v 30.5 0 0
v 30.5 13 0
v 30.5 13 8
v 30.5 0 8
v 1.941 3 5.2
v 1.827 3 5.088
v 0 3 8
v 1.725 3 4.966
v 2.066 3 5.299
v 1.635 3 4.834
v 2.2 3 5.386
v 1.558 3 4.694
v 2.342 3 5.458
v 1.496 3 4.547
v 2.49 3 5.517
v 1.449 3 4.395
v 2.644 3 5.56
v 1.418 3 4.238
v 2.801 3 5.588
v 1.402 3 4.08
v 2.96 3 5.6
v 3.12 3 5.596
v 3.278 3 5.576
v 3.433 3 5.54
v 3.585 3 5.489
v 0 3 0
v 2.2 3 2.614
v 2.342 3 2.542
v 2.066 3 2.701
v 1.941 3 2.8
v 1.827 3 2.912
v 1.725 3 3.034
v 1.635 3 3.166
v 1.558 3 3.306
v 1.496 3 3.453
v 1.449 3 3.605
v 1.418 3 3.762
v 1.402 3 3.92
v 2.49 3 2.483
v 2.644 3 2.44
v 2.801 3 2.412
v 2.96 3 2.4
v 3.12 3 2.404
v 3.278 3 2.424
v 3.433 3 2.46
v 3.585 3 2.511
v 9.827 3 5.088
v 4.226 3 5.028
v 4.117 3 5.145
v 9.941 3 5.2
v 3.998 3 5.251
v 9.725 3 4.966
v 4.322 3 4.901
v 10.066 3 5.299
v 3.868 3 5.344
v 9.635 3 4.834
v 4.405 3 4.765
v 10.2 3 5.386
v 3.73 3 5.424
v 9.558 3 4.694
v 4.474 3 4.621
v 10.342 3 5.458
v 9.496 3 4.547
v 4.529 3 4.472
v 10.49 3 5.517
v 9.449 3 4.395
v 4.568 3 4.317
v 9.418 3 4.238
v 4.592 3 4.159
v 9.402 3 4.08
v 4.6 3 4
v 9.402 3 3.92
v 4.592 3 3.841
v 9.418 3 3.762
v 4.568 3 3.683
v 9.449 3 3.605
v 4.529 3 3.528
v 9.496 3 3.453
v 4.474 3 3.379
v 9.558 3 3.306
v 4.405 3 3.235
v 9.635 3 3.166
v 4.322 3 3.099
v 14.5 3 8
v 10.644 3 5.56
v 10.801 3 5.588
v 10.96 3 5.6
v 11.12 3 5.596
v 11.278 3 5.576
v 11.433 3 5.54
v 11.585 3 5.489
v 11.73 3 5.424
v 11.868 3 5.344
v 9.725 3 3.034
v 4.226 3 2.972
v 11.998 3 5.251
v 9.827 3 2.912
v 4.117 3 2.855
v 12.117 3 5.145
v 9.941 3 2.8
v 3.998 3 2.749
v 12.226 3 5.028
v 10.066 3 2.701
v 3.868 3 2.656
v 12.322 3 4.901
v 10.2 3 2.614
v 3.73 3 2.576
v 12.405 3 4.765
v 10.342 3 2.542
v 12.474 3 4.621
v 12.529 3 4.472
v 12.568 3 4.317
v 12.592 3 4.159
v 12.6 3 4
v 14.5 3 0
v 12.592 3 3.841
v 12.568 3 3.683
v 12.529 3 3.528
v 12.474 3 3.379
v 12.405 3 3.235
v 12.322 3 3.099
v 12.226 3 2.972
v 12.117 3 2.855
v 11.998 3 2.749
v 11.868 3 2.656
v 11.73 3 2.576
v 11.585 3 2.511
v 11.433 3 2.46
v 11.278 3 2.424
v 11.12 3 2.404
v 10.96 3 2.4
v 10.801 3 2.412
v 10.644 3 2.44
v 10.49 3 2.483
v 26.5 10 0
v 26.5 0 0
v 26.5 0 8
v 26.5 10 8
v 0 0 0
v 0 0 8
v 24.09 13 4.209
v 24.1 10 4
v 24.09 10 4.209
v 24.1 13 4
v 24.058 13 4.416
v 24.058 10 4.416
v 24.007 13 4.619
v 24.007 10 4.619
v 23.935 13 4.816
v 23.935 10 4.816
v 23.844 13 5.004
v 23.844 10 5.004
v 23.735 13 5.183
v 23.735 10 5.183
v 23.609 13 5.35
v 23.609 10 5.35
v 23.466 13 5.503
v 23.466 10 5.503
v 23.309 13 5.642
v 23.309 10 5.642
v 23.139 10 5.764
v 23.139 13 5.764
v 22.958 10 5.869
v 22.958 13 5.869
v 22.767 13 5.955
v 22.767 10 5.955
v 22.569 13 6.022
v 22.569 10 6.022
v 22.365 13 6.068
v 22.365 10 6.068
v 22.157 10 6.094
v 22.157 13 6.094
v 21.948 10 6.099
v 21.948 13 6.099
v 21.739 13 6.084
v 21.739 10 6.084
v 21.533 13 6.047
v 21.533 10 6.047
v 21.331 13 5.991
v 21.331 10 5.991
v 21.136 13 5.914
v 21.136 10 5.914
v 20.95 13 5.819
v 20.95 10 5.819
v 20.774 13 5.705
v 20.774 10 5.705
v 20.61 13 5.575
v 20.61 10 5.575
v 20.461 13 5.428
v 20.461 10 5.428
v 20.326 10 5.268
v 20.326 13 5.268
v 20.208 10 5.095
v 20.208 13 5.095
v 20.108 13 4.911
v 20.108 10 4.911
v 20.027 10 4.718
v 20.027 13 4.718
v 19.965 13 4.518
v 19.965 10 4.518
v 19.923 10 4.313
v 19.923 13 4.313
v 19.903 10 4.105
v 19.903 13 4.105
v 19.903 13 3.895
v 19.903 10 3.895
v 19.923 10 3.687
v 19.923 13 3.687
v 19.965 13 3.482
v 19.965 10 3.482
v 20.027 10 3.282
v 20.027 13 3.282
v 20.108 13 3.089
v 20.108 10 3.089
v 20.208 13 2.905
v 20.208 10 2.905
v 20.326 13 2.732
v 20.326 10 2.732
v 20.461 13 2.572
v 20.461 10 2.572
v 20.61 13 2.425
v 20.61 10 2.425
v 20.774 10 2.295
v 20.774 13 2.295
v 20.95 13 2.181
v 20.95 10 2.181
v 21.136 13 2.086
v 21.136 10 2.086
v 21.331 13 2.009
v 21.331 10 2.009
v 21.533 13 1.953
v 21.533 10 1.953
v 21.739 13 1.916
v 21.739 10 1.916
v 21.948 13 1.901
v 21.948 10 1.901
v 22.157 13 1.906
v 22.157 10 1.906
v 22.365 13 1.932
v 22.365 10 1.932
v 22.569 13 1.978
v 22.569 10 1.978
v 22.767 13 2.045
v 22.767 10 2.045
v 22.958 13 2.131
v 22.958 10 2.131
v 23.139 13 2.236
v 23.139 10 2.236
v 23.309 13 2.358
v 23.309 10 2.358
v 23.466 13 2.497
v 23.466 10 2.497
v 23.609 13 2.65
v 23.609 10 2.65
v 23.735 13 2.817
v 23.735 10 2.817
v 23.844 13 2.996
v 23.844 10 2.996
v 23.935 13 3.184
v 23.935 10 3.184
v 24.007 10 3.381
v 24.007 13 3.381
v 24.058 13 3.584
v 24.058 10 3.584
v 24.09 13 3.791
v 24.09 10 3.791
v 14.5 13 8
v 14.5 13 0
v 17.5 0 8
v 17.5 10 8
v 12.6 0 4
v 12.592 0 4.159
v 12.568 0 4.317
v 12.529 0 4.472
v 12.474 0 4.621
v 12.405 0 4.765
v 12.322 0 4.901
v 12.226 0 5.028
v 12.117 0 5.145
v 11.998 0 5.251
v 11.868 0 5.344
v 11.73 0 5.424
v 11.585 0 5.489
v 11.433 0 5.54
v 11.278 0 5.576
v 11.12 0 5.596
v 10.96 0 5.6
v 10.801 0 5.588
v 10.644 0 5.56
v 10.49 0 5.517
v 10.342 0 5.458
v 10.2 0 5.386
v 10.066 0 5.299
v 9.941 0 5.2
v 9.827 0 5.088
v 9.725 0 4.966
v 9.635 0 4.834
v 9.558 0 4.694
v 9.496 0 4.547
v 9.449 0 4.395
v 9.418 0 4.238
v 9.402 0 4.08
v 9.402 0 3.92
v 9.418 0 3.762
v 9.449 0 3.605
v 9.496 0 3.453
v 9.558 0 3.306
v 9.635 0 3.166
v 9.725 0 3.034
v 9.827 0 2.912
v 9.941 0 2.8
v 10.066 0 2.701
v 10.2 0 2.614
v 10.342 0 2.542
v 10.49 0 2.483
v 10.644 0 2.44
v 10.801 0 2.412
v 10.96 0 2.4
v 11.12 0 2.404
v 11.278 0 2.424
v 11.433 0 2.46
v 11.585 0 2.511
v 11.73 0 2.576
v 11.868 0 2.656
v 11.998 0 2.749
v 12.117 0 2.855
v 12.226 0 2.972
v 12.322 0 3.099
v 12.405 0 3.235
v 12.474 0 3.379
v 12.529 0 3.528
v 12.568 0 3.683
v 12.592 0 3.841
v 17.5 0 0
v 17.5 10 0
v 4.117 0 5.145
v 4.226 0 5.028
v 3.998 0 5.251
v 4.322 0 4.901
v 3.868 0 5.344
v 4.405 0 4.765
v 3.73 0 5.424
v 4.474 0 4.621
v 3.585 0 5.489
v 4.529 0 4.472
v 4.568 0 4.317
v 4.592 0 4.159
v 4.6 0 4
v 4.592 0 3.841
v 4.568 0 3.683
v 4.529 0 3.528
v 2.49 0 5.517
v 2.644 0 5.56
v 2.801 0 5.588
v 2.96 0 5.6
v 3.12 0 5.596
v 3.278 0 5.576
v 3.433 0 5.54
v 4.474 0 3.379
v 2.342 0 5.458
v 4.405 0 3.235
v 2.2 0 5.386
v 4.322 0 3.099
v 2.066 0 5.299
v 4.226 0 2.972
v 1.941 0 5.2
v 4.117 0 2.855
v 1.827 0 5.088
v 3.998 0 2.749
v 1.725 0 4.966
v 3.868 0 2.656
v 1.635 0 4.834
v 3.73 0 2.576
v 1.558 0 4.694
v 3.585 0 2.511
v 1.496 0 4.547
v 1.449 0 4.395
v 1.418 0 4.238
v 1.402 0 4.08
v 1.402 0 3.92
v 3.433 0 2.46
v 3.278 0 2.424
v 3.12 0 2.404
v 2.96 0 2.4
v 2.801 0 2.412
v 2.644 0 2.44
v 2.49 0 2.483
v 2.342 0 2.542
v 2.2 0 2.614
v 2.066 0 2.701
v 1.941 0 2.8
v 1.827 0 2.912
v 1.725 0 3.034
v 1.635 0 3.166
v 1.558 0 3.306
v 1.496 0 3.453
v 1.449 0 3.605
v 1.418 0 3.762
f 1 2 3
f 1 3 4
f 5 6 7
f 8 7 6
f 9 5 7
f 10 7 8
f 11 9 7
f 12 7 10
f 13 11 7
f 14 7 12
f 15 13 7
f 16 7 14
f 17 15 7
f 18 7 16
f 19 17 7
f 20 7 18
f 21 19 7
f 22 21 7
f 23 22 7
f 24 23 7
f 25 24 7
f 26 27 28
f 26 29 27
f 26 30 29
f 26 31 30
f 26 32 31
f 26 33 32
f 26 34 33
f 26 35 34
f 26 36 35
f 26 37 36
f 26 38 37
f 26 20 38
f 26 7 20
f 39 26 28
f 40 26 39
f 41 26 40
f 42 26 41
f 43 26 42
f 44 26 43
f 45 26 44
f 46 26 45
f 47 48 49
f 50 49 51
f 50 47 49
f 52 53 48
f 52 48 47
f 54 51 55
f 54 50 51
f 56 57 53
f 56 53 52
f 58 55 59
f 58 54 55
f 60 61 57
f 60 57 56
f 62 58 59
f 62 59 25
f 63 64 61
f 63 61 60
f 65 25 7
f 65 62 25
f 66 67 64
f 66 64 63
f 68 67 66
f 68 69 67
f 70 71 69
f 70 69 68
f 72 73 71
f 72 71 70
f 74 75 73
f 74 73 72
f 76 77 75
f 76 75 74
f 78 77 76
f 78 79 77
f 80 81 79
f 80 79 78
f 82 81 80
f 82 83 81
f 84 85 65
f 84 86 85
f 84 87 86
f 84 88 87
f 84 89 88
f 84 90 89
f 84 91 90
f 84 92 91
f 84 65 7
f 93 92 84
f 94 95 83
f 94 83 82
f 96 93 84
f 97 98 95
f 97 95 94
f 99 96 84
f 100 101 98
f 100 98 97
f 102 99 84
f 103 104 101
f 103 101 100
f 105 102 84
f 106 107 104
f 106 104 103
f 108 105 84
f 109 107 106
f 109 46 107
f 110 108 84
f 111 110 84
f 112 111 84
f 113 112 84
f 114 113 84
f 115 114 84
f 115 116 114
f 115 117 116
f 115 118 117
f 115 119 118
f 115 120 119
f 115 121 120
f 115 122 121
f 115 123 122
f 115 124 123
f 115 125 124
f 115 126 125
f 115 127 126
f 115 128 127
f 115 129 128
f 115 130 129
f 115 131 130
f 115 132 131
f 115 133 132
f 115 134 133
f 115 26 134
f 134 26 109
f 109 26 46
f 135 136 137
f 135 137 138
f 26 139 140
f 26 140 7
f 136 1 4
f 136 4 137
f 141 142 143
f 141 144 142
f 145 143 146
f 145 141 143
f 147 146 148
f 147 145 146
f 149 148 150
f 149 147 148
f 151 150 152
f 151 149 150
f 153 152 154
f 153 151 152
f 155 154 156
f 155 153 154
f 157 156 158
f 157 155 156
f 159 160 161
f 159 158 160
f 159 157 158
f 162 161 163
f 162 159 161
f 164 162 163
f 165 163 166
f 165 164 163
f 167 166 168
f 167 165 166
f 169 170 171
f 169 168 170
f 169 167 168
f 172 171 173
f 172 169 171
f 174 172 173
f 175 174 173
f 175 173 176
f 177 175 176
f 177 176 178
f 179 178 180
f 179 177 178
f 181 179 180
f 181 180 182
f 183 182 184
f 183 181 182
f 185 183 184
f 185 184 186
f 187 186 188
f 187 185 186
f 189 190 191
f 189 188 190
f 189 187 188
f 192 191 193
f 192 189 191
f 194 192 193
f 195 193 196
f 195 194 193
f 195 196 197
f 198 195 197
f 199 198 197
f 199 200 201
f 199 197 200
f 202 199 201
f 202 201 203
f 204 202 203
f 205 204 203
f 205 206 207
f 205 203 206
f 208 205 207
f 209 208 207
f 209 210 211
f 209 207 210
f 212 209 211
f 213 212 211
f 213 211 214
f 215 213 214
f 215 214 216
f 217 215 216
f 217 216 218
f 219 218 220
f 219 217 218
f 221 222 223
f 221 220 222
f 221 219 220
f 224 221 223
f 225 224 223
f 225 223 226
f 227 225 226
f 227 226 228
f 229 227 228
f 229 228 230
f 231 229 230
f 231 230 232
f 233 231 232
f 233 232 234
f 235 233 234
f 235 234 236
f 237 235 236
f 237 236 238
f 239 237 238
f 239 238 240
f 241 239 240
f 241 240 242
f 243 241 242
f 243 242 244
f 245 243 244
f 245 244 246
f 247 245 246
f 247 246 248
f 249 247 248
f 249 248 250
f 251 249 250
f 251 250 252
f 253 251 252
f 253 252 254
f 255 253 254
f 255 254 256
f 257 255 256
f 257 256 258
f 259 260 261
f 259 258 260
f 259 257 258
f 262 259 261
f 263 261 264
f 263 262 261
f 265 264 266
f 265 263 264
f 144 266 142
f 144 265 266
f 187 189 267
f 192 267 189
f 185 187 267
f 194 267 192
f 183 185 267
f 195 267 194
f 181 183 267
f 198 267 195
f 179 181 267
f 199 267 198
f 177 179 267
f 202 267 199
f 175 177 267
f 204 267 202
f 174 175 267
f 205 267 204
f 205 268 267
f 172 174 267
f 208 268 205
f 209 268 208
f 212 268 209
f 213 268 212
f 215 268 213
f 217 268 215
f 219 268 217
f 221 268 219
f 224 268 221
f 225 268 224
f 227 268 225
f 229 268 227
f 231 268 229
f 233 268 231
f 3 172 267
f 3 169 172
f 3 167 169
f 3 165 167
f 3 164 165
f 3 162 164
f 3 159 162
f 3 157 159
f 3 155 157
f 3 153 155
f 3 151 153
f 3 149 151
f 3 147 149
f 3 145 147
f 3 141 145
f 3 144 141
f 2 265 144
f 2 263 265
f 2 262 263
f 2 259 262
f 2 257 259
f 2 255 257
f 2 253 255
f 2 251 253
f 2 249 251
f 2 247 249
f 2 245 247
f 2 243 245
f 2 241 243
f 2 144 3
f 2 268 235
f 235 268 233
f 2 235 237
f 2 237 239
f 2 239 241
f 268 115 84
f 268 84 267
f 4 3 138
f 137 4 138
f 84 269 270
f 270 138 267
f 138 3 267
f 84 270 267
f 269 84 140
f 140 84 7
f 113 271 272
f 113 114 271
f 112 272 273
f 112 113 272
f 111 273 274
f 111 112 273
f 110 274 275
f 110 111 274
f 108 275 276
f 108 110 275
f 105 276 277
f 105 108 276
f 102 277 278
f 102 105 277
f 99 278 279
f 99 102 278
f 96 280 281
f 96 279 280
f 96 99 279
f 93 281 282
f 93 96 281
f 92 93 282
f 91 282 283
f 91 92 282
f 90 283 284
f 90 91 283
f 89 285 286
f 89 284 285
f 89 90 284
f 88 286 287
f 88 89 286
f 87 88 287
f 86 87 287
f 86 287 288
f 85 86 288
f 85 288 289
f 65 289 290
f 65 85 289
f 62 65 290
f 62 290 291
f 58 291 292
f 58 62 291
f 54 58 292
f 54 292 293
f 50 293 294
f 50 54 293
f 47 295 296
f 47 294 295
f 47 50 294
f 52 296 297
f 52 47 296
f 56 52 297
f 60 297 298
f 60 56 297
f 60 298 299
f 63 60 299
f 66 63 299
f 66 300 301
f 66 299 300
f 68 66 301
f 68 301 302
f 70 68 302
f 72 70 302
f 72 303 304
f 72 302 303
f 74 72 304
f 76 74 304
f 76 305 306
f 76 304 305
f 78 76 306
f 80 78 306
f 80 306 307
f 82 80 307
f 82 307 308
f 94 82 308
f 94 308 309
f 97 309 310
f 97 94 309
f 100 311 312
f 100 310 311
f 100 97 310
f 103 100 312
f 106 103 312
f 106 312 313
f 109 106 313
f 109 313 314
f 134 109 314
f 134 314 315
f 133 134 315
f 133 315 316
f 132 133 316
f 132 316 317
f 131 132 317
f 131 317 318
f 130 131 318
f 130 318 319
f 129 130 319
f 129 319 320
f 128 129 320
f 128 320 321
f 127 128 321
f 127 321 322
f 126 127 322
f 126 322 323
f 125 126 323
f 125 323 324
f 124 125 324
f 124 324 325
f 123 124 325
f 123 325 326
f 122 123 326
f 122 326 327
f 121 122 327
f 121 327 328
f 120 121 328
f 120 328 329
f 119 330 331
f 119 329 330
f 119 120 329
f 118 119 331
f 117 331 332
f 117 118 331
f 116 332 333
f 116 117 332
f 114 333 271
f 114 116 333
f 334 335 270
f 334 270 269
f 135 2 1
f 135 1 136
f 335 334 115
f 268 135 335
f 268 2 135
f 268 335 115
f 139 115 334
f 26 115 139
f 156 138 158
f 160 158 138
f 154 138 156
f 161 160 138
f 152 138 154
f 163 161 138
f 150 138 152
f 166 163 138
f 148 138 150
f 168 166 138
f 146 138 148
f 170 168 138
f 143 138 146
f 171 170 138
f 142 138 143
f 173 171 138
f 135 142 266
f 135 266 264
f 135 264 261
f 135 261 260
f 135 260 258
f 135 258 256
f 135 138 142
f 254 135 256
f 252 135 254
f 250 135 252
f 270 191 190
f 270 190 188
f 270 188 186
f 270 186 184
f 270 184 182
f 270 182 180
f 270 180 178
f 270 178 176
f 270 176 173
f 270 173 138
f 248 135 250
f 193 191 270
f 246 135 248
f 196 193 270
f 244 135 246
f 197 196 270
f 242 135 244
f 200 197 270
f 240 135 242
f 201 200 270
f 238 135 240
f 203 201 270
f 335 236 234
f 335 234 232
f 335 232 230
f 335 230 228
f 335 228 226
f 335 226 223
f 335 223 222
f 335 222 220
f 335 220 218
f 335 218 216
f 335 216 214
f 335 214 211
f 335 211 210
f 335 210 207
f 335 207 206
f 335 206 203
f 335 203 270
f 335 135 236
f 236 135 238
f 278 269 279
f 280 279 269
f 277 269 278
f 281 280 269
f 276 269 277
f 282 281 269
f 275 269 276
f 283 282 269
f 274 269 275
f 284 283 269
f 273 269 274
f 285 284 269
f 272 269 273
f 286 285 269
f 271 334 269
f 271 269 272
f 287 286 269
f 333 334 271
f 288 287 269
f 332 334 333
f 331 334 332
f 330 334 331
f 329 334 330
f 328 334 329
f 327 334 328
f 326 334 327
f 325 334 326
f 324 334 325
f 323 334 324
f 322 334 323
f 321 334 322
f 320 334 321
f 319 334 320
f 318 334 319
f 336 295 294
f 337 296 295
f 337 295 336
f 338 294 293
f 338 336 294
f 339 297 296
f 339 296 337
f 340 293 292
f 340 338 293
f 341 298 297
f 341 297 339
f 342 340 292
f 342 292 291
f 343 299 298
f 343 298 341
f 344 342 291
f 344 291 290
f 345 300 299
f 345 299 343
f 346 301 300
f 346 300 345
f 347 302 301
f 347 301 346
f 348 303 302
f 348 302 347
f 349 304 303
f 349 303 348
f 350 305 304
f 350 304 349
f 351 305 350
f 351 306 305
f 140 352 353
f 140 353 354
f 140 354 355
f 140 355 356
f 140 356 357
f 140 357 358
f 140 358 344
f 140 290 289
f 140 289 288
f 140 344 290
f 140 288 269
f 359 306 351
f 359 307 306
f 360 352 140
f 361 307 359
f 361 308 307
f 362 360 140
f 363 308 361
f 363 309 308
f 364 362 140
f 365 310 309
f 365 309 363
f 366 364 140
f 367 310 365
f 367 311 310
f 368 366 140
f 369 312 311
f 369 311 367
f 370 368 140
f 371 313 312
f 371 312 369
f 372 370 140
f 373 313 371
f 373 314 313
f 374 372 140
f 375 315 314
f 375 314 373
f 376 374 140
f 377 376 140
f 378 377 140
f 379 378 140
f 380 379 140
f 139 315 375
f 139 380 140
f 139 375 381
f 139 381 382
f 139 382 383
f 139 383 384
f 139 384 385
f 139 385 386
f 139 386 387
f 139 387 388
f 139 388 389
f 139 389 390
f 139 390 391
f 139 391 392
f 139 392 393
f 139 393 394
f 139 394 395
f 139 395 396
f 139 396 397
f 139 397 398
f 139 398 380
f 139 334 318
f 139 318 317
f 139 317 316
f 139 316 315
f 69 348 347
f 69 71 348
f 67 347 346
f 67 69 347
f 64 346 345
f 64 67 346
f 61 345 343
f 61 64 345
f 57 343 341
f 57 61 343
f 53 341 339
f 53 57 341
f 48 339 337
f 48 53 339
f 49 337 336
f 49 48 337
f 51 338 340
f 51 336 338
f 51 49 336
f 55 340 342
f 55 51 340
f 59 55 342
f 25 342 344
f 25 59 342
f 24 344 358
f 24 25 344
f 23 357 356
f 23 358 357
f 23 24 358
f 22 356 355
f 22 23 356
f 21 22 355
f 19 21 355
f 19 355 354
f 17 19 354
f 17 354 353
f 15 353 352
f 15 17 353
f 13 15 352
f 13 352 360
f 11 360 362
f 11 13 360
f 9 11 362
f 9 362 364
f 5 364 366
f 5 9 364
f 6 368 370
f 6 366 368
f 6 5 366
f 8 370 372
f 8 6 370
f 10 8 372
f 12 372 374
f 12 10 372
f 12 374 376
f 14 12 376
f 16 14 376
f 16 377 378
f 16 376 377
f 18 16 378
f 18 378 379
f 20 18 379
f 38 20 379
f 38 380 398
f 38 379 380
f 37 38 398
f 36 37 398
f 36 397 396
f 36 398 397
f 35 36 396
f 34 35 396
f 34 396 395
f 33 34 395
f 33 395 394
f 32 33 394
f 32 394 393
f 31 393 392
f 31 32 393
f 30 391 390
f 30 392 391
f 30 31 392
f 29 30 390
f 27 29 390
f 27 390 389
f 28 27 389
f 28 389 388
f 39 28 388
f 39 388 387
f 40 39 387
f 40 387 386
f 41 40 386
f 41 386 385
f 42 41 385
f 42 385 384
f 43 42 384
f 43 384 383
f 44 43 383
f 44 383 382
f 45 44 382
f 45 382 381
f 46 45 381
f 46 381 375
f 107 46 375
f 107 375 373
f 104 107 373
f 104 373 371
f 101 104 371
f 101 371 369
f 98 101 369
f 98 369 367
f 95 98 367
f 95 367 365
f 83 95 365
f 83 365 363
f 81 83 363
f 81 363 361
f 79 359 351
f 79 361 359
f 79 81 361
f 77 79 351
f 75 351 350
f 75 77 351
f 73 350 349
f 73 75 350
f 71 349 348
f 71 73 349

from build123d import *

# Parameters (mm, degrees)
EXTRUDE_1_DEPTH          = 8
CUT_EXTRUDE_1_DEPTH      = 34.079449814
CUT_EXTRUDE_1_DEPTH_BACK = 34.079449814
SKETCH_2_R               = 1.6
SKETCH_2_R_2             = 2.1


with BuildPart() as part:
    # 草图1 → 凸台-拉伸1 (new body)
    with BuildSketch(Plane.XY):
        Polygon((0, 0), (0, 3), (14.5, 3), (14.5, 13), (30.5, 13), (30.5, 0), (26.5, 0), (26.5, 10), (17.5, 10), (17.5, 0), align=None)
    extrude(amount=EXTRUDE_1_DEPTH)

    # 草图2 → 切除-拉伸1 (cut, two sides: drawn at the far end of the back side and taken through both)
    with BuildSketch(Plane.XZ.offset(-10).offset(-CUT_EXTRUDE_1_DEPTH_BACK)):
        with Locations((3, 4)):
            Circle(SKETCH_2_R)
        with Locations((11, 4)):
            Circle(SKETCH_2_R)
        with Locations((22, 4)):
            Circle(SKETCH_2_R_2)
    extrude(amount=CUT_EXTRUDE_1_DEPTH + CUT_EXTRUDE_1_DEPTH_BACK, mode=Mode.SUBTRACT)


solid = part.part
